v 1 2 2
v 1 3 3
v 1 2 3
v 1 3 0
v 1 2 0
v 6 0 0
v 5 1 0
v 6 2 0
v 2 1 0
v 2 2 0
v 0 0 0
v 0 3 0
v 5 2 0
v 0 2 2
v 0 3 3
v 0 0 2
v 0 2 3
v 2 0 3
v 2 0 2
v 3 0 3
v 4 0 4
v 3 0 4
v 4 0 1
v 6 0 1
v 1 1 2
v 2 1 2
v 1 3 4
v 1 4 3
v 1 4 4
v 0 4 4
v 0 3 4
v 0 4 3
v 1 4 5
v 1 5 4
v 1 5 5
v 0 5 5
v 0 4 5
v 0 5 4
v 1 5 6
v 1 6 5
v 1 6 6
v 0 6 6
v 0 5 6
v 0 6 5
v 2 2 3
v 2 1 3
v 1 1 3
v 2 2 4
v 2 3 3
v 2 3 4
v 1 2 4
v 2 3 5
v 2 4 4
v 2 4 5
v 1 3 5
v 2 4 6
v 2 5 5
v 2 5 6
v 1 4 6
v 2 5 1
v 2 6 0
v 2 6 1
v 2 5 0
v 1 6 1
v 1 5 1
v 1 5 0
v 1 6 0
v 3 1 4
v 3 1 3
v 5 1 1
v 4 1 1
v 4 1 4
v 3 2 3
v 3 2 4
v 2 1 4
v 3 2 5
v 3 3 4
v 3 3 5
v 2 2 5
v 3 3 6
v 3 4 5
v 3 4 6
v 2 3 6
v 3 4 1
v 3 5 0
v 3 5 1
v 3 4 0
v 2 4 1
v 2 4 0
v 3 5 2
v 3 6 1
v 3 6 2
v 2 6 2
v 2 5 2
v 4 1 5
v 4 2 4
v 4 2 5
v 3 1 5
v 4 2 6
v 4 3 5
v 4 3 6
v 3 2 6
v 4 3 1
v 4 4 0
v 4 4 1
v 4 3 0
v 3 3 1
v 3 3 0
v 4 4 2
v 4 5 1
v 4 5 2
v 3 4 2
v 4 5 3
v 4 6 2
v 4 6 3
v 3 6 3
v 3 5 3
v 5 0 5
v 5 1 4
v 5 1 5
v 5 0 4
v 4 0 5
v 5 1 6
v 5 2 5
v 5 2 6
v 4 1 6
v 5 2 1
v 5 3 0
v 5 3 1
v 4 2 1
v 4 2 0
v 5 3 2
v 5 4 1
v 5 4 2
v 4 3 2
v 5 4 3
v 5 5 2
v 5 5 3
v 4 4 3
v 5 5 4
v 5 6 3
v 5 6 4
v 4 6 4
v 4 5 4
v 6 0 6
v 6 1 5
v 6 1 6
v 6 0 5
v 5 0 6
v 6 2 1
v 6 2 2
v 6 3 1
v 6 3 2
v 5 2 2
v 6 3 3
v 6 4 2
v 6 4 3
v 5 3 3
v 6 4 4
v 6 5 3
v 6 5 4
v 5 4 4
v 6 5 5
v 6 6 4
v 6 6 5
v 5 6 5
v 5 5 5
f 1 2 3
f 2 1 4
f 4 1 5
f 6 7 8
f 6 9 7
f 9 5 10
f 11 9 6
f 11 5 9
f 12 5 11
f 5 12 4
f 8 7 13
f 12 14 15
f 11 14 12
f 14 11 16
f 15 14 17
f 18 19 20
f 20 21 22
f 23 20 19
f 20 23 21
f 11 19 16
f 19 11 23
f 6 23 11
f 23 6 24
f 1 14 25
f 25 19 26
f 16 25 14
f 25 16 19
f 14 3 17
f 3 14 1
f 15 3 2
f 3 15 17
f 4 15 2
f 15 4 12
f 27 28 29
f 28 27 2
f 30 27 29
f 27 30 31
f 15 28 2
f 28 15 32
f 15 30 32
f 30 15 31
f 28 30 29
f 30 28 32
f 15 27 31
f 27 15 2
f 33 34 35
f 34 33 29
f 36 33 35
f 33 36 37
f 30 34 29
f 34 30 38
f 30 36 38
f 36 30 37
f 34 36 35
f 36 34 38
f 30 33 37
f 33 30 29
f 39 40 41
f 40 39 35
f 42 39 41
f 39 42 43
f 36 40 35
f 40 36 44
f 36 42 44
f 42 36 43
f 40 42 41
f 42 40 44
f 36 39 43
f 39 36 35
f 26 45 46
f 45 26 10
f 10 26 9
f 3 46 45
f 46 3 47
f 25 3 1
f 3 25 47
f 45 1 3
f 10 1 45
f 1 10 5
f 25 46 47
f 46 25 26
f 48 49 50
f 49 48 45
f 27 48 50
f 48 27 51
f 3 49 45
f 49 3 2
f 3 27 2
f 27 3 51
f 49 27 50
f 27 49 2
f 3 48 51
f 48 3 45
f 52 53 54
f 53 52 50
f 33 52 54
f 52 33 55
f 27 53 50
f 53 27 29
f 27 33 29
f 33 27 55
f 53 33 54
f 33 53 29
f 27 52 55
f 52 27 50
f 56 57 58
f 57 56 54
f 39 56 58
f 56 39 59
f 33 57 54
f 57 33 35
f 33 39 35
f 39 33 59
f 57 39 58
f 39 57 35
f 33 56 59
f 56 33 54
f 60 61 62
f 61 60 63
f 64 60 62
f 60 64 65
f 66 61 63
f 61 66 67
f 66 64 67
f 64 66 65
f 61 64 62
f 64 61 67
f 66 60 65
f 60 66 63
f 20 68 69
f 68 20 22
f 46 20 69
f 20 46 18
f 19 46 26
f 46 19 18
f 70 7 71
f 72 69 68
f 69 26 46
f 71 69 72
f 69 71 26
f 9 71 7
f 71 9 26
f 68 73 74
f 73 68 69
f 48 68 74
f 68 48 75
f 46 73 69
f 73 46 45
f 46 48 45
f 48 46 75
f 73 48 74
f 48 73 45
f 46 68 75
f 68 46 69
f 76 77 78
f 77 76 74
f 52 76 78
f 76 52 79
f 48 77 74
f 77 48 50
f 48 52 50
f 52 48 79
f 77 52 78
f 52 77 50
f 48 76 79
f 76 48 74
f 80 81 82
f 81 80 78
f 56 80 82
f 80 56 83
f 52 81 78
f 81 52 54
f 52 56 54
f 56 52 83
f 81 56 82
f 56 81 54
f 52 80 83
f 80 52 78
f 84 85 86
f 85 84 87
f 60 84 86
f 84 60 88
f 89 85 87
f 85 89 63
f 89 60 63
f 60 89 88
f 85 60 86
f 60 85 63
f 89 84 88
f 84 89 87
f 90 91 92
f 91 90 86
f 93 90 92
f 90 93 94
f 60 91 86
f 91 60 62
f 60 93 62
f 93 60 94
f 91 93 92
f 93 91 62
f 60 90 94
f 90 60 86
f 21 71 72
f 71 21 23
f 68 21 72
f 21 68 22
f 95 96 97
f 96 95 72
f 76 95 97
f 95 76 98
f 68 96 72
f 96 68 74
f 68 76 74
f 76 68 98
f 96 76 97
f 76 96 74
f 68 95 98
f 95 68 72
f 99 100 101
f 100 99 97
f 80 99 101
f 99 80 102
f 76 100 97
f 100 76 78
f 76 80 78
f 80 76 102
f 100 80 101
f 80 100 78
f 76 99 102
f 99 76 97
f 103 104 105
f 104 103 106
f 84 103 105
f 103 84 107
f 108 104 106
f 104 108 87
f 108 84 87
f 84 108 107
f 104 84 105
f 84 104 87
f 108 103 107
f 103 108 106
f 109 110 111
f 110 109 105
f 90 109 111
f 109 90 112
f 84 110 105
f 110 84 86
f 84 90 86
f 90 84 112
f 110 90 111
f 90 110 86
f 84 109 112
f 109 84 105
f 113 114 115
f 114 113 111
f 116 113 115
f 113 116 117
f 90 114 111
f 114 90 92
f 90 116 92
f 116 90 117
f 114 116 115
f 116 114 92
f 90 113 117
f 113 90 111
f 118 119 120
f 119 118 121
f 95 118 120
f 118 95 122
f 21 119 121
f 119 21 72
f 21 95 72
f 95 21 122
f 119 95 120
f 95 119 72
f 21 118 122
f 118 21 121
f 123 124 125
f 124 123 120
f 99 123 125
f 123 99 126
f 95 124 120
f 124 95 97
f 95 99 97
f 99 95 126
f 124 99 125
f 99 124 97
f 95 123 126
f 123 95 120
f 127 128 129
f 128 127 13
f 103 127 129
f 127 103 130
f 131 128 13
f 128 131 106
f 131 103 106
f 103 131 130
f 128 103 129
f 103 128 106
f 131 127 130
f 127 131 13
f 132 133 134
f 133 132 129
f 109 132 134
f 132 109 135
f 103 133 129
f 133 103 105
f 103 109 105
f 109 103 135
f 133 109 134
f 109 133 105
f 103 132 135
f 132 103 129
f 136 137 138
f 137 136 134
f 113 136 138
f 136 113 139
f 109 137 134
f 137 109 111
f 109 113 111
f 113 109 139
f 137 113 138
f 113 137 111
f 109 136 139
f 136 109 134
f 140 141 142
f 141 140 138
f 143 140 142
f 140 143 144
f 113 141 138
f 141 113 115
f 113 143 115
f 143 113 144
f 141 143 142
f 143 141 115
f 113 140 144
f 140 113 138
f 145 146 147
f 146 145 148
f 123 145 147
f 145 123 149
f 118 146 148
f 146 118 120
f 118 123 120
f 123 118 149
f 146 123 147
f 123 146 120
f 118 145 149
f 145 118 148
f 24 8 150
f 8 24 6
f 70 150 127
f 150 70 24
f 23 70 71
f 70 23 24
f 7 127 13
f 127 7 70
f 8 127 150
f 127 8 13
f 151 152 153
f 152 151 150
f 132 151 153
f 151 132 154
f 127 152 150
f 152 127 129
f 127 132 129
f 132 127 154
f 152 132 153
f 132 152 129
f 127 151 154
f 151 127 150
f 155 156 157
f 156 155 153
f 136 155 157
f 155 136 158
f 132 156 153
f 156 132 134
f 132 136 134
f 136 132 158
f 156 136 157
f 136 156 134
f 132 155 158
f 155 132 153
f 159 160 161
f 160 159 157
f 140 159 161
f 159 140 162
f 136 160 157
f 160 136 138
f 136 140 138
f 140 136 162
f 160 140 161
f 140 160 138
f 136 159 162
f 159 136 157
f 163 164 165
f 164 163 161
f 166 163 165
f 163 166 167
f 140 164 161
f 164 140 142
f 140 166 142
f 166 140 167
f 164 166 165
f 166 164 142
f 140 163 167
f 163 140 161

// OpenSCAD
union() {
    translate([0, 0, 0]) cube([1, 1, 1]);
    translate([0, 1, 1]) cube([1, 1, 1]);
    translate([0, 2, 2]) cube([1, 1, 1]);
    translate([0, 3, 3]) cube([1, 1, 1]);
    translate([0, 4, 4]) cube([1, 1, 1]);
    translate([0, 5, 5]) cube([1, 1, 1]);
    translate([1, 0, 1]) cube([1, 1, 1]);
    translate([1, 1, 2]) cube([1, 1, 1]);
    translate([1, 2, 3]) cube([1, 1, 1]);
    translate([1, 3, 4]) cube([1, 1, 1]);
    translate([1, 4, 5]) cube([1, 1, 1]);
    translate([1, 5, 0]) cube([1, 1, 1]);
    translate([2, 0, 2]) cube([1, 1, 1]);
    translate([2, 1, 3]) cube([1, 1, 1]);
    translate([2, 2, 4]) cube([1, 1, 1]);
    translate([2, 3, 5]) cube([1, 1, 1]);
    translate([2, 4, 0]) cube([1, 1, 1]);
    translate([2, 5, 1]) cube([1, 1, 1]);
    translate([3, 0, 3]) cube([1, 1, 1]);
    translate([3, 1, 4]) cube([1, 1, 1]);
    translate([3, 2, 5]) cube([1, 1, 1]);
    translate([3, 3, 0]) cube([1, 1, 1]);
    translate([3, 4, 1]) cube([1, 1, 1]);
    translate([3, 5, 2]) cube([1, 1, 1]);
    translate([4, 0, 4]) cube([1, 1, 1]);
    translate([4, 1, 5]) cube([1, 1, 1]);
    translate([4, 2, 0]) cube([1, 1, 1]);
    translate([4, 3, 1]) cube([1, 1, 1]);
    translate([4, 4, 2]) cube([1, 1, 1]);
    translate([4, 5, 3]) cube([1, 1, 1]);
    translate([5, 0, 5]) cube([1, 1, 1]);
    translate([5, 1, 0]) cube([1, 1, 1]);
    translate([5, 2, 1]) cube([1, 1, 1]);
    translate([5, 3, 2]) cube([1, 1, 1]);
    translate([5, 4, 3]) cube([1, 1, 1]);
    translate([5, 5, 4]) cube([1, 1, 1]);
    translate([0, 0, 1]) cube([1, 1, 1]);
    translate([0, 1, 0]) cube([1, 1, 1]);
    translate([1, 0, 0]) cube([1, 1, 1]);
    translate([1, 1, 0]) cube([1, 1, 1]);
    translate([1, 1, 1]) cube([1, 1, 1]);
    translate([2, 0, 0]) cube([1, 1, 1]);
    translate([2, 0, 1]) cube([1, 1, 1]);
    translate([3, 0, 0]) cube([1, 1, 1]);
    translate([3, 0, 1]) cube([1, 1, 1]);
    translate([3, 0, 2]) cube([1, 1, 1]);
    translate([4, 0, 0]) cube([1, 1, 1]);
    translate([5, 0, 0]) cube([1, 1, 1]);
    translate([0, 2, 0]) cube([1, 1, 1]);
    translate([0, 2, 1]) cube([1, 1, 1]);
}
